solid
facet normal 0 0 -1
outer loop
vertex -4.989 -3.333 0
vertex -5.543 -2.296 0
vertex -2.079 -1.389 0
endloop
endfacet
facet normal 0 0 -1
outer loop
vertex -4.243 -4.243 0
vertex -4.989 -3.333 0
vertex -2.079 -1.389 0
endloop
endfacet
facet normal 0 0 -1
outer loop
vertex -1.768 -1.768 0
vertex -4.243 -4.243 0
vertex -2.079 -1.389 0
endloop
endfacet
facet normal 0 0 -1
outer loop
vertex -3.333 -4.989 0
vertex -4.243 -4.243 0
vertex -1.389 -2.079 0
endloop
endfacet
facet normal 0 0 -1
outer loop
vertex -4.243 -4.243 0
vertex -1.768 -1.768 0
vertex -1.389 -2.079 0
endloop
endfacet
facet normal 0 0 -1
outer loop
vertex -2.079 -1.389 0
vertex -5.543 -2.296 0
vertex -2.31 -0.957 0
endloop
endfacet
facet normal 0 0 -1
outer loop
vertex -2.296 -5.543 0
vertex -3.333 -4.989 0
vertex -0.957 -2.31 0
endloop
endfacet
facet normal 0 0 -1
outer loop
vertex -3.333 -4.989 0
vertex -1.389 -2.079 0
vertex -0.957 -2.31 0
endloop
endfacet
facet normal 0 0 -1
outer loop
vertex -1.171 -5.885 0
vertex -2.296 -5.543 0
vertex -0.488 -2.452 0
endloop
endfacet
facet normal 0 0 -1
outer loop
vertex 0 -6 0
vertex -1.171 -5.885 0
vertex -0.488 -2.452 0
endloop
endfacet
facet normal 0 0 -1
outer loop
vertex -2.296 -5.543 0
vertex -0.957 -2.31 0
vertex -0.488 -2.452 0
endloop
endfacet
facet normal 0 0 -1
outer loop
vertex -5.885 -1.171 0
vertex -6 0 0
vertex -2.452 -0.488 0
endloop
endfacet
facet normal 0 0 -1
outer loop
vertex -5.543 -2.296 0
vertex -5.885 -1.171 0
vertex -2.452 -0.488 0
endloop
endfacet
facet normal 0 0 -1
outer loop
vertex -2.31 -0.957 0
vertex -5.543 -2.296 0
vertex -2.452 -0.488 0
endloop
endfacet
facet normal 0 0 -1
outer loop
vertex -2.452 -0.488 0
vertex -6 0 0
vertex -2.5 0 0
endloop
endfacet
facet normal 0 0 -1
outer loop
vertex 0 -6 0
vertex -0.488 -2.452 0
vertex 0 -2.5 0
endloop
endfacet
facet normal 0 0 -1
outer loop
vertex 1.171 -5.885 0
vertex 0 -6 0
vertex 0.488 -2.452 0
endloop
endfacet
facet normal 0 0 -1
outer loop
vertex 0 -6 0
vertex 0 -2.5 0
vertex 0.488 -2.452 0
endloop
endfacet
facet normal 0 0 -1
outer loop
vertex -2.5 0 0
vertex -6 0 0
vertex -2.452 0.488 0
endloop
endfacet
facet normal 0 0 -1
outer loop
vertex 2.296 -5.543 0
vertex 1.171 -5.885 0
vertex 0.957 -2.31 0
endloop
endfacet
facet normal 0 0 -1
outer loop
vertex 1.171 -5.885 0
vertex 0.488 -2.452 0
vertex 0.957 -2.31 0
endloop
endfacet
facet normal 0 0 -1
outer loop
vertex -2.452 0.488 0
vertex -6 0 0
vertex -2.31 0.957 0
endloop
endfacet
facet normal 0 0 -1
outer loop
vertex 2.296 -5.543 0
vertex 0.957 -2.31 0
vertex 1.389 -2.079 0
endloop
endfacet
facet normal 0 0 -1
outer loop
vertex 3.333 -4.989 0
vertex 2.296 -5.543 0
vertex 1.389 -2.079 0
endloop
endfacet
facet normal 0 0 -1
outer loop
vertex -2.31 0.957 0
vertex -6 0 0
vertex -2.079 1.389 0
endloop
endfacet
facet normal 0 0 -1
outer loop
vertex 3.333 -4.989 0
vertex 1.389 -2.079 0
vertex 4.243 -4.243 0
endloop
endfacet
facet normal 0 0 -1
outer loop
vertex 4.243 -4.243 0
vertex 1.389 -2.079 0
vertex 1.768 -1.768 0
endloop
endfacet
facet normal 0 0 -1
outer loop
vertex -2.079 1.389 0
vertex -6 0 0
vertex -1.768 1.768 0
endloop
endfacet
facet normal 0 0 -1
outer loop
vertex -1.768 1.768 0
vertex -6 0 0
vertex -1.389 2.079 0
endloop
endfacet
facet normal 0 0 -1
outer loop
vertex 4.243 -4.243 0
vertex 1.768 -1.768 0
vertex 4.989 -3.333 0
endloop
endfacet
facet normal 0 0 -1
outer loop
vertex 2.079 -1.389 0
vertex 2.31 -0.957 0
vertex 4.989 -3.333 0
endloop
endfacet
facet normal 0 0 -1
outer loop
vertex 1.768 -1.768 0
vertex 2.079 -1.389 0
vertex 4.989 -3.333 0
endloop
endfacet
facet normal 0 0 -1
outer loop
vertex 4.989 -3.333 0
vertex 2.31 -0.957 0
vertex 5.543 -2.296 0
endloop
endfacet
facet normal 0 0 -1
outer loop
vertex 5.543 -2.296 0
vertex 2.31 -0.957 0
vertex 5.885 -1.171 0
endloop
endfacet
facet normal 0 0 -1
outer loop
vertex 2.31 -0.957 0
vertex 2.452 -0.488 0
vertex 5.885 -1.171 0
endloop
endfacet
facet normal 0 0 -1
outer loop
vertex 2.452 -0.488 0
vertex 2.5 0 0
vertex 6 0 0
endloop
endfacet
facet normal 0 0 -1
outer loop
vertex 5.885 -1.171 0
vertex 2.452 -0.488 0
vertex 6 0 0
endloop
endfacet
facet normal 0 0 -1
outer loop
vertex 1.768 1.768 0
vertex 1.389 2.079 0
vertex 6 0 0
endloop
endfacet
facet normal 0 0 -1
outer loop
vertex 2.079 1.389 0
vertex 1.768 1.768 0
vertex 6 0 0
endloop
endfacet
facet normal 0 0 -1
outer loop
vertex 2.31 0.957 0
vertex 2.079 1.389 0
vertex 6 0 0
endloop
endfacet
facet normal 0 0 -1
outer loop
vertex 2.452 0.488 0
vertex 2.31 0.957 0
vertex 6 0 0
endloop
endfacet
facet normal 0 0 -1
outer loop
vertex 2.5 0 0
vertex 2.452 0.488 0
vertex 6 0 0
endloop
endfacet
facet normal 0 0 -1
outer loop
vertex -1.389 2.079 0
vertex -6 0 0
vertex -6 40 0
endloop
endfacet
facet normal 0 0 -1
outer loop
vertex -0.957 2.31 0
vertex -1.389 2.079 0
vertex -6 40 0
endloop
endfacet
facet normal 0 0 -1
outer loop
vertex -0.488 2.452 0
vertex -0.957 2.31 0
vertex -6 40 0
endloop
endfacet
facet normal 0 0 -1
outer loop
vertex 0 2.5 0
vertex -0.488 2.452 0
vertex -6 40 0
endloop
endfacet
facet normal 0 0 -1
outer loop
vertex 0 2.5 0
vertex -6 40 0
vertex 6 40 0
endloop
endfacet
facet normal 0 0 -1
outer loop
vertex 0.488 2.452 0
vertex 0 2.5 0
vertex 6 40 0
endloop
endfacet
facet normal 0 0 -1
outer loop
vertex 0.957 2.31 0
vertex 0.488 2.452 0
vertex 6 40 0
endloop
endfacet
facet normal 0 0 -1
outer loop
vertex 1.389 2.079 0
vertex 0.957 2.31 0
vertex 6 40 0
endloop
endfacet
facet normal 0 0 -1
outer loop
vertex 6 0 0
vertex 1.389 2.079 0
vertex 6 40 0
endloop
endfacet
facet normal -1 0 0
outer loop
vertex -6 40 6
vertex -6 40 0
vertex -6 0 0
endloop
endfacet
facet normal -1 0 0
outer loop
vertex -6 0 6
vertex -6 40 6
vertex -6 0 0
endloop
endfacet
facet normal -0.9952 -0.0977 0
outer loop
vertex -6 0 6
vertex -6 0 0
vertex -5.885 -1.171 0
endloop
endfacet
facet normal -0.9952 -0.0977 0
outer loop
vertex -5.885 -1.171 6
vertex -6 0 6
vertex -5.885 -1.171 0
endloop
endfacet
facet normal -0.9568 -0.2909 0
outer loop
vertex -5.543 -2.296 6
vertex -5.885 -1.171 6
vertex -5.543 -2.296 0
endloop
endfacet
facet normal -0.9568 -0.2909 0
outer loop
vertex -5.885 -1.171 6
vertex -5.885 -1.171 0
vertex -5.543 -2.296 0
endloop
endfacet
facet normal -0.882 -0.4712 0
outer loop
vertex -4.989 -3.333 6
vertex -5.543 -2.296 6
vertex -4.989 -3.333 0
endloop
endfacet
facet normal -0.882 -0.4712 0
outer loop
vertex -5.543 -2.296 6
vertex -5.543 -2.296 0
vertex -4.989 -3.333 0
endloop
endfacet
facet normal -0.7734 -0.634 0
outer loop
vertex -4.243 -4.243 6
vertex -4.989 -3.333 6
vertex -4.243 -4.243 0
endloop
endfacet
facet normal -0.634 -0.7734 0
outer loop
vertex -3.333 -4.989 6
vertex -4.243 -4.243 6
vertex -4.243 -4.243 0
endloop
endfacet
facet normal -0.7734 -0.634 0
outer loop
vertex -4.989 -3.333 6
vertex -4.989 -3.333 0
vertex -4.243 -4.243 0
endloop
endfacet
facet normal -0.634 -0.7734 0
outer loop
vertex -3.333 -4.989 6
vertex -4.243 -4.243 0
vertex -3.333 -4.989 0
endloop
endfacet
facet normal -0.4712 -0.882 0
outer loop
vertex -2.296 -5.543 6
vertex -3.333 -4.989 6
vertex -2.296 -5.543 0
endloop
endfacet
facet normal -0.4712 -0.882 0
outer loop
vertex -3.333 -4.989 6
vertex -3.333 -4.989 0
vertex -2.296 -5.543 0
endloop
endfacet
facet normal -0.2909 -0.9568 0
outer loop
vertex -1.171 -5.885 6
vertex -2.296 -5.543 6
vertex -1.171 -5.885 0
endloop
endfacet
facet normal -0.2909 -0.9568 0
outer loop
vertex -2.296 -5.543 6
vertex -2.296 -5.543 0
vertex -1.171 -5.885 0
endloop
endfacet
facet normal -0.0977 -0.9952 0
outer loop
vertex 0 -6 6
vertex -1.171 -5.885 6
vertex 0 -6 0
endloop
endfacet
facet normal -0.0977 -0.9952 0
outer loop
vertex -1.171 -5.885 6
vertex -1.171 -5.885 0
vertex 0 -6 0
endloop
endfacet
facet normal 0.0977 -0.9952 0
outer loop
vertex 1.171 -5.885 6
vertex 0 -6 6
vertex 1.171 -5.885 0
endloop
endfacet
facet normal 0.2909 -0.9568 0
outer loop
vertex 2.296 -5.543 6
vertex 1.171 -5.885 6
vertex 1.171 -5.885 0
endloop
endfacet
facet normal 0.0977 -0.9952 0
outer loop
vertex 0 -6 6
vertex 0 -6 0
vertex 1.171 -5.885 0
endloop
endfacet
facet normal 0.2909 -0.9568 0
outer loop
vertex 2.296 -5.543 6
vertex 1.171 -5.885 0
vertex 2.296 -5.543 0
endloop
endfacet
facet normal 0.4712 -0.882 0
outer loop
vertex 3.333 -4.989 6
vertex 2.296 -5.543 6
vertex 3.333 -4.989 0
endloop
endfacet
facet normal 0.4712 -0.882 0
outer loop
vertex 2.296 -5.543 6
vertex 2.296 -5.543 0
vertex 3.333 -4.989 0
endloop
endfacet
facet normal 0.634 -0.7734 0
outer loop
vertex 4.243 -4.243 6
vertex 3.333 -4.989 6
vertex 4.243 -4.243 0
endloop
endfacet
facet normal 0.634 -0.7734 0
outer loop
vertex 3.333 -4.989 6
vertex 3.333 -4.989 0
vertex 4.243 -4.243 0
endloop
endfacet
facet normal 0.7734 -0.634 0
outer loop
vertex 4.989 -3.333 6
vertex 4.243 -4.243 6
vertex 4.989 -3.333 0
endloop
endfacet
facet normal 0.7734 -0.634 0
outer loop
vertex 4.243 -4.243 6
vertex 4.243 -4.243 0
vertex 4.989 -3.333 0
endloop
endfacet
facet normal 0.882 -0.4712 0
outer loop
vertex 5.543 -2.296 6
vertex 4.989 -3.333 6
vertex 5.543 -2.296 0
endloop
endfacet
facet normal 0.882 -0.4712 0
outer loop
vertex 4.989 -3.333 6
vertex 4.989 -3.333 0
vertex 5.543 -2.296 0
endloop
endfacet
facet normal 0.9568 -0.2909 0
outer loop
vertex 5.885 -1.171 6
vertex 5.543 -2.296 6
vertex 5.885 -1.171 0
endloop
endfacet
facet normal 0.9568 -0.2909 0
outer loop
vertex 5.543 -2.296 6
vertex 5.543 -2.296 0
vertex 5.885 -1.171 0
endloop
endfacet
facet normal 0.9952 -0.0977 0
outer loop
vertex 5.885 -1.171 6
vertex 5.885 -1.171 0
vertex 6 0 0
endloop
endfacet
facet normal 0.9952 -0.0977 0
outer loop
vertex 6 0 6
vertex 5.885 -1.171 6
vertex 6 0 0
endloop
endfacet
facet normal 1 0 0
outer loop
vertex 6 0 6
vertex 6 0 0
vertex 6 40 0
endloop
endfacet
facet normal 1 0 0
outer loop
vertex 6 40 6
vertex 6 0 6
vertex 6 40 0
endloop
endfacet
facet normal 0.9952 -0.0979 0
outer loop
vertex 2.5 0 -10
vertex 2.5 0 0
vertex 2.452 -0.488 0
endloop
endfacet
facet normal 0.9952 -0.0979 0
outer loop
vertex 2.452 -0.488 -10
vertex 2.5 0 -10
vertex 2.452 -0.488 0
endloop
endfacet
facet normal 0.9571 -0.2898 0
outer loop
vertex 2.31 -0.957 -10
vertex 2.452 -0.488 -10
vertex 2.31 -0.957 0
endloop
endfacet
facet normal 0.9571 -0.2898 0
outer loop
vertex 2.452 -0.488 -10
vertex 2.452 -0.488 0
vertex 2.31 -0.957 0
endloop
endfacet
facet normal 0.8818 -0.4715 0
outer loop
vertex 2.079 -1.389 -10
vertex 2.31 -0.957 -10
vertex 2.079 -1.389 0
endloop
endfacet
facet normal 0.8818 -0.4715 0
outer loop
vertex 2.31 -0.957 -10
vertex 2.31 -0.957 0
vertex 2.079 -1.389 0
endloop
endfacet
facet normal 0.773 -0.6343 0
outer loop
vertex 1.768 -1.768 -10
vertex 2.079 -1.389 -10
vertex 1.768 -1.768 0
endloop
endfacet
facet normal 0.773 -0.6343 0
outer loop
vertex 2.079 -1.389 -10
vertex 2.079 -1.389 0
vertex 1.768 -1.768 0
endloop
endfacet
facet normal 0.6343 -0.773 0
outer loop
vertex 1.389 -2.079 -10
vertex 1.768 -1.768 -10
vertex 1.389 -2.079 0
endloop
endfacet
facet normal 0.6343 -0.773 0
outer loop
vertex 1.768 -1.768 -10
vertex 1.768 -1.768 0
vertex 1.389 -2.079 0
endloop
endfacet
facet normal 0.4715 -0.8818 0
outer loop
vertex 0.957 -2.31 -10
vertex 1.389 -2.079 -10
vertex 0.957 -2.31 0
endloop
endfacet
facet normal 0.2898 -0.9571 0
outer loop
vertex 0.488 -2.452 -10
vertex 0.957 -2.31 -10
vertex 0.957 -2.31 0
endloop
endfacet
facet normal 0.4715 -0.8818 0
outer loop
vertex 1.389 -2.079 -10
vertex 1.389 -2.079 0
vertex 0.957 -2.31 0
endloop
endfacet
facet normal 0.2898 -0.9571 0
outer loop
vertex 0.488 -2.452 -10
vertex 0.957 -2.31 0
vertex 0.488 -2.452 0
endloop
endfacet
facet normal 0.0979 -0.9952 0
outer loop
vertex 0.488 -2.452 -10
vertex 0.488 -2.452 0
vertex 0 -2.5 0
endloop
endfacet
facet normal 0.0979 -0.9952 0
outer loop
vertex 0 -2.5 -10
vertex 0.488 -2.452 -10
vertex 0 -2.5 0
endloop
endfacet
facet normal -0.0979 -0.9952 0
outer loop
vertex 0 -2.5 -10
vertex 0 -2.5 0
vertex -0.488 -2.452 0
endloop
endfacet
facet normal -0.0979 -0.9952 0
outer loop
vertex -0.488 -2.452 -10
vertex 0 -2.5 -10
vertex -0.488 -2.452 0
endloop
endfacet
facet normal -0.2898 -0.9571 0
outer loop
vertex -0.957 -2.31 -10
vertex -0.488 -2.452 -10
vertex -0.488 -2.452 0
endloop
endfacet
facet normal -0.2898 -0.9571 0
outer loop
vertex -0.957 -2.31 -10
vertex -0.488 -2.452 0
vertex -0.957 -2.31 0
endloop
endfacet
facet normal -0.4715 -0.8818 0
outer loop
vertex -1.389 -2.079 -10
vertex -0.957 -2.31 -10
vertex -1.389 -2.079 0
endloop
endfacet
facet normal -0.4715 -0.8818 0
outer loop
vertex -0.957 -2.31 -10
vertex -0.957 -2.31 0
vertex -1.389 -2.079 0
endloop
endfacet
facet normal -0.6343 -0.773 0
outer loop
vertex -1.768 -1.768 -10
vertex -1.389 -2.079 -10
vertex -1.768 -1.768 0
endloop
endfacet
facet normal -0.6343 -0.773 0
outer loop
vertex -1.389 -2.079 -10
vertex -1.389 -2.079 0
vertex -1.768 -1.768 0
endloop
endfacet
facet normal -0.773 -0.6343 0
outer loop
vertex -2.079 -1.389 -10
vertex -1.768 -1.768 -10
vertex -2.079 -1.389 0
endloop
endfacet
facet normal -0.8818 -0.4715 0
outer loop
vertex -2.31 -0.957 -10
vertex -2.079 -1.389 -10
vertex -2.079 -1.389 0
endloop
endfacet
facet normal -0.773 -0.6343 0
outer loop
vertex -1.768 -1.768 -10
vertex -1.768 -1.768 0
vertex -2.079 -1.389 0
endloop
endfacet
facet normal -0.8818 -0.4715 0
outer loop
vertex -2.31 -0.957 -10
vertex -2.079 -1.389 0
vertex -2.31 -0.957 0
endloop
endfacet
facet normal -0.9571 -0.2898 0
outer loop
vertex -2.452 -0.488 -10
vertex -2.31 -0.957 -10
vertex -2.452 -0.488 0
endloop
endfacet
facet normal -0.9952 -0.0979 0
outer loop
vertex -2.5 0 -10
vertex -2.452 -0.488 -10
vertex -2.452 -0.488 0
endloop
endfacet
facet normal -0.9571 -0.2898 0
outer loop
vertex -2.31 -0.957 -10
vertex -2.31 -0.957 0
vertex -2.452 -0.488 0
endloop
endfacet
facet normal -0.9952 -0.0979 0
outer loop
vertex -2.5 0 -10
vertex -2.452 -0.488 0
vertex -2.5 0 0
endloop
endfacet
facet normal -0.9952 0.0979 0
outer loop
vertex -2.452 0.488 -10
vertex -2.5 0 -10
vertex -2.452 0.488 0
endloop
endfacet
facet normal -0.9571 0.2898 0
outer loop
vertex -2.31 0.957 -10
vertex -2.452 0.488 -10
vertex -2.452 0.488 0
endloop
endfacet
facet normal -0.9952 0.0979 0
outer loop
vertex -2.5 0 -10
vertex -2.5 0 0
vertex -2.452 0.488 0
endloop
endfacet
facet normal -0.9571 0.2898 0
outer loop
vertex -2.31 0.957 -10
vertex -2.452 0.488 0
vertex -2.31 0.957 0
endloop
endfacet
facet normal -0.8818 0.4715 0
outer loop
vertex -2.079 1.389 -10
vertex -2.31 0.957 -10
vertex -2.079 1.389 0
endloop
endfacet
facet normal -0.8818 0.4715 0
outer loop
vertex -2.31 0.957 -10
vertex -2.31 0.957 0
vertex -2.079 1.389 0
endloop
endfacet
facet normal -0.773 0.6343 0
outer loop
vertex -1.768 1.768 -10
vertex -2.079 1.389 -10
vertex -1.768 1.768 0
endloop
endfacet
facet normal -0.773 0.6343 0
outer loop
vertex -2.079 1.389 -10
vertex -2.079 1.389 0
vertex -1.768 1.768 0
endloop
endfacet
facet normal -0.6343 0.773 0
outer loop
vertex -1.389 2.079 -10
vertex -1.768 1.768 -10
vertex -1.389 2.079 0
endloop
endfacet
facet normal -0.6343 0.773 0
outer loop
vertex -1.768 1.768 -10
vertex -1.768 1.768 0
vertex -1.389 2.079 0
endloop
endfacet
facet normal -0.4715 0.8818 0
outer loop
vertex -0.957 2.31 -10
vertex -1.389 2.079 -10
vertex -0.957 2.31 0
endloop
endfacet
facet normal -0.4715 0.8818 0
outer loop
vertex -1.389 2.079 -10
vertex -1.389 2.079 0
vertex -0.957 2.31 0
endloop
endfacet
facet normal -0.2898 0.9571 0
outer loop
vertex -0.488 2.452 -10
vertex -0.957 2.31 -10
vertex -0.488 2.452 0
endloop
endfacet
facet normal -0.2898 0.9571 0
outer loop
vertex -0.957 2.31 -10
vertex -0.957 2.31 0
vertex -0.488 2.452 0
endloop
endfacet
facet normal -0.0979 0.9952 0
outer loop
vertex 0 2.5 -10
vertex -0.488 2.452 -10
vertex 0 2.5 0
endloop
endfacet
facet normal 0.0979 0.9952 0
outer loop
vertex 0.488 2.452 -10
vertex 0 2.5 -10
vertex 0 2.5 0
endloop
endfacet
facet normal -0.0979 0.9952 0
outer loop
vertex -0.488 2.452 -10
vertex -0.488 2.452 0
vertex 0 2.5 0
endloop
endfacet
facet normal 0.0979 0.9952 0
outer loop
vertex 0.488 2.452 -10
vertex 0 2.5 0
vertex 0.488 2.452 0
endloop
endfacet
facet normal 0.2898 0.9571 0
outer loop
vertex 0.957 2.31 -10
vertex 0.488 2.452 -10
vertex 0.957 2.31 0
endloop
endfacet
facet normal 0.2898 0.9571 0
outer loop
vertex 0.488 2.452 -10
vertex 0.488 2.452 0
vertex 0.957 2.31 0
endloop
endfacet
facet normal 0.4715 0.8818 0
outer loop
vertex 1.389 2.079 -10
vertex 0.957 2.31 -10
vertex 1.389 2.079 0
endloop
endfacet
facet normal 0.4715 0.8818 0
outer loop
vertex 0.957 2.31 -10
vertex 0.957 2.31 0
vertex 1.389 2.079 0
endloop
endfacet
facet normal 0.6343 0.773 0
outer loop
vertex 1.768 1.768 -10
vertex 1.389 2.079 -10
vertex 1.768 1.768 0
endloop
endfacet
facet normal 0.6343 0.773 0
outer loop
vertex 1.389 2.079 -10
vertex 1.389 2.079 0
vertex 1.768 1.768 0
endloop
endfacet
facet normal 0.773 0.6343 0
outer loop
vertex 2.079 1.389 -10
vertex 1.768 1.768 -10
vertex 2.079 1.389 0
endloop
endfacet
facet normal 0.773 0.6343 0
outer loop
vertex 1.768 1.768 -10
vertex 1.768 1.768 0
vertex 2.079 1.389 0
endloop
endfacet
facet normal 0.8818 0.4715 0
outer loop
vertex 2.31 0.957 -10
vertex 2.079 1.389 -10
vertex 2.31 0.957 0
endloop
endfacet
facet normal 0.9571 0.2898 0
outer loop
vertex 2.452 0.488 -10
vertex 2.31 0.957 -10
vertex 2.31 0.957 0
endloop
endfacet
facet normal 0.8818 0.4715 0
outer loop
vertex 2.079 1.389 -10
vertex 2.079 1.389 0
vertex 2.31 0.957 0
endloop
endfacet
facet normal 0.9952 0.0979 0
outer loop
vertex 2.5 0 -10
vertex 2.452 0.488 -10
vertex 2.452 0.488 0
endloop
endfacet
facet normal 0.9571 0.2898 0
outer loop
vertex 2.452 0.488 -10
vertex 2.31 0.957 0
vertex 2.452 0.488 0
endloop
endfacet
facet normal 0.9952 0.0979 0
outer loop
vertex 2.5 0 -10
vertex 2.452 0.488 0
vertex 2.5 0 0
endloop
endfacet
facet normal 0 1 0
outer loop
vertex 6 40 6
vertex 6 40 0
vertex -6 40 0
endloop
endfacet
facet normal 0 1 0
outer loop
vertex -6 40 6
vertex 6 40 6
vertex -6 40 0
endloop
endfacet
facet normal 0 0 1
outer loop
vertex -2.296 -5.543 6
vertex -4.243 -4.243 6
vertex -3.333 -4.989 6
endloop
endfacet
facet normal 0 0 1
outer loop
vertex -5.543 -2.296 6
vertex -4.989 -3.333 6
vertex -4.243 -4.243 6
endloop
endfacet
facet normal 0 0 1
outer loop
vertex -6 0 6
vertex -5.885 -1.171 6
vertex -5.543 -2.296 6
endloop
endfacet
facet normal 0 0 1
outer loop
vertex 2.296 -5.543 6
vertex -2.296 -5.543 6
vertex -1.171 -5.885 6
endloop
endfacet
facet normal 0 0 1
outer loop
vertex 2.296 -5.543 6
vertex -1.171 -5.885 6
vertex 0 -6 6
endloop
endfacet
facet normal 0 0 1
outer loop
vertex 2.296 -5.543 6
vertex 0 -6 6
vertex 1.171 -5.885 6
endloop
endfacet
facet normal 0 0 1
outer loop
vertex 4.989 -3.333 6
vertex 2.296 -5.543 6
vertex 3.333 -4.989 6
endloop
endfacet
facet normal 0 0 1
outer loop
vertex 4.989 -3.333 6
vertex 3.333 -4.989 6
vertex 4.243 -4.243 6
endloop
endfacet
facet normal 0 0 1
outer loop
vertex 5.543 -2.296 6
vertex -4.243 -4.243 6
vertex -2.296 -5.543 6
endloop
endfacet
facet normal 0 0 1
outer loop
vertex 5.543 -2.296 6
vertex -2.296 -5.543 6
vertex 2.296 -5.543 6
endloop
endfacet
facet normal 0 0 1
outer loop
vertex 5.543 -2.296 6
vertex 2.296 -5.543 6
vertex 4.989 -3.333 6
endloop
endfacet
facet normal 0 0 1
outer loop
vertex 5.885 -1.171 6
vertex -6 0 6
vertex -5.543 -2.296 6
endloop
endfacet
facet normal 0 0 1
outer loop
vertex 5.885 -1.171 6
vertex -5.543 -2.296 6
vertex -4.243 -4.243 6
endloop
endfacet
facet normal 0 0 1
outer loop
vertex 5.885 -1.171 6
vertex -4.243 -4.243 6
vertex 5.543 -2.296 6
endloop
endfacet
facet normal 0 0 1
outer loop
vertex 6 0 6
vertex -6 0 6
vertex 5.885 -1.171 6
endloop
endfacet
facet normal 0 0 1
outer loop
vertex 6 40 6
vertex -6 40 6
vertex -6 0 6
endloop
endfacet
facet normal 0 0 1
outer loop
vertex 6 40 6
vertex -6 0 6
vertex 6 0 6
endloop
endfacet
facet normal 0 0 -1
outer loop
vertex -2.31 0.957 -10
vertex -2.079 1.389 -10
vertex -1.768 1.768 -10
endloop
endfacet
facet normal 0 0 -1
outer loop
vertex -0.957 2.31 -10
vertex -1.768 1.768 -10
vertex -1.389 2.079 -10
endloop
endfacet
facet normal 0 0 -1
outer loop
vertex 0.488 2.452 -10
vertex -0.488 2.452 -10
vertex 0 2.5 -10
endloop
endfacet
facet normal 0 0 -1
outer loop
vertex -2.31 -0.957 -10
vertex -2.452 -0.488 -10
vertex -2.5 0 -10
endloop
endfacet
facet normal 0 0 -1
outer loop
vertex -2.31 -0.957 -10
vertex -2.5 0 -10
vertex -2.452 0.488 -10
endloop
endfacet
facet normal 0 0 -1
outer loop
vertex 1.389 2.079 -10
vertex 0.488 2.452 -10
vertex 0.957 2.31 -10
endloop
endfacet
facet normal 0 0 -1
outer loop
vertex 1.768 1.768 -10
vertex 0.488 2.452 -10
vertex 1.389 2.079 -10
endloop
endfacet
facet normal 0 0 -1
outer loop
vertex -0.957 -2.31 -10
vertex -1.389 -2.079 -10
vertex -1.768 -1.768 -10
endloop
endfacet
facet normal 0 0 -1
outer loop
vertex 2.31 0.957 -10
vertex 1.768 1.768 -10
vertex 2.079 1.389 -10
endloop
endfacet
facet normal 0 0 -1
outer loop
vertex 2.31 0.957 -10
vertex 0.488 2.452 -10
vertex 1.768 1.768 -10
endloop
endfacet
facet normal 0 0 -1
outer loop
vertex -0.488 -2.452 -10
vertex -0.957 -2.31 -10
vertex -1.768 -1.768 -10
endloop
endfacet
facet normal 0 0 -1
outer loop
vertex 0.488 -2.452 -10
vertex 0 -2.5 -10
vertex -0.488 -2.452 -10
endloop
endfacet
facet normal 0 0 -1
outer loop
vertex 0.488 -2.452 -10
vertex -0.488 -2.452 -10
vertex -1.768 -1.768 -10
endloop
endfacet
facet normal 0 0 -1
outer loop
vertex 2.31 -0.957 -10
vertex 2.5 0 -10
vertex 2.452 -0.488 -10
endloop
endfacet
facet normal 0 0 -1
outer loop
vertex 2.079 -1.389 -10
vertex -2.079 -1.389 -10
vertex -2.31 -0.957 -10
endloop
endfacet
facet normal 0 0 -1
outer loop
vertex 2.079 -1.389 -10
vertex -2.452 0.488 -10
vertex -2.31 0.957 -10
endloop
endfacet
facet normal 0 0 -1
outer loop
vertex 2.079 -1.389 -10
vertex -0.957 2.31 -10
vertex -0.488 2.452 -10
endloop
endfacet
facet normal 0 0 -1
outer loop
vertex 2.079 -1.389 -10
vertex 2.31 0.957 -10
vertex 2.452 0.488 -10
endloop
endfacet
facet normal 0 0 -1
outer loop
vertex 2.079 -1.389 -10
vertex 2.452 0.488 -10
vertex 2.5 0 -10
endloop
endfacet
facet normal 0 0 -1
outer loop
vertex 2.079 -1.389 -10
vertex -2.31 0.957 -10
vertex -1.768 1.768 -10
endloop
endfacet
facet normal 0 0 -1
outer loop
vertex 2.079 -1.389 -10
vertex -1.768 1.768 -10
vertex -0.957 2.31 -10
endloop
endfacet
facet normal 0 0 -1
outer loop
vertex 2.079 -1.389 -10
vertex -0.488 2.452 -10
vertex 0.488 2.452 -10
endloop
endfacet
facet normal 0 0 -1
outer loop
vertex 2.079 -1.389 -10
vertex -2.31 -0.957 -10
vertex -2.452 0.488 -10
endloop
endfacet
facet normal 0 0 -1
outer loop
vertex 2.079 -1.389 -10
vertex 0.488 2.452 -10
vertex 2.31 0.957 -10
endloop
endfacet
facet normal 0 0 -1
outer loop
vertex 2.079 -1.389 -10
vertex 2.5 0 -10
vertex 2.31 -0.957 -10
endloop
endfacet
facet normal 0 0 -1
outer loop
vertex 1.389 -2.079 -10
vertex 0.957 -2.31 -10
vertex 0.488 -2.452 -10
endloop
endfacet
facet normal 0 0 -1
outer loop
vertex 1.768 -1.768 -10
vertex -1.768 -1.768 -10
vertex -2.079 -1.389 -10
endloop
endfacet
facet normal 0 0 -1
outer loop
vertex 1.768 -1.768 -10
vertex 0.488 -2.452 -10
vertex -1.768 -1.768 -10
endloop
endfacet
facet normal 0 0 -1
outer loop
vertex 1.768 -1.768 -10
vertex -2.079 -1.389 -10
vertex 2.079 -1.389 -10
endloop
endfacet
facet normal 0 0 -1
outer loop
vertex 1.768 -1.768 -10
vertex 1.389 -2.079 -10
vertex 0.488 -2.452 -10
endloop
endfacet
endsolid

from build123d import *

# Parameters (mm, degrees)
EXTRUDE_1_DEPTH = 6
SKETCH_2_R      = 2.5
EXTRUDE_2_DEPTH = 10


with BuildPart() as part:
    # 草圖1 → 伸長1 (new body)
    with BuildSketch(Plane.XY):
        with BuildLine():
            Line((-6, 40), (-6, 0))
            ThreePointArc((-6, 0), (0, -6), (6, 0))
            Line((6, 0), (6, 40))
            Line((6, 40), (-6, 40))
        make_face()
    extrude(amount=EXTRUDE_1_DEPTH)

    # 草圖2 → 伸長2 (add)
    with BuildSketch(Plane(origin=(0, 0, 0), x_dir=(-1, 0, 0), z_dir=(0, 0, -1))):
        with Locations(Location((0, 0, 0), (0, 0, 180))):
            Circle(SKETCH_2_R)
    extrude(amount=EXTRUDE_2_DEPTH)


solid = part.part
